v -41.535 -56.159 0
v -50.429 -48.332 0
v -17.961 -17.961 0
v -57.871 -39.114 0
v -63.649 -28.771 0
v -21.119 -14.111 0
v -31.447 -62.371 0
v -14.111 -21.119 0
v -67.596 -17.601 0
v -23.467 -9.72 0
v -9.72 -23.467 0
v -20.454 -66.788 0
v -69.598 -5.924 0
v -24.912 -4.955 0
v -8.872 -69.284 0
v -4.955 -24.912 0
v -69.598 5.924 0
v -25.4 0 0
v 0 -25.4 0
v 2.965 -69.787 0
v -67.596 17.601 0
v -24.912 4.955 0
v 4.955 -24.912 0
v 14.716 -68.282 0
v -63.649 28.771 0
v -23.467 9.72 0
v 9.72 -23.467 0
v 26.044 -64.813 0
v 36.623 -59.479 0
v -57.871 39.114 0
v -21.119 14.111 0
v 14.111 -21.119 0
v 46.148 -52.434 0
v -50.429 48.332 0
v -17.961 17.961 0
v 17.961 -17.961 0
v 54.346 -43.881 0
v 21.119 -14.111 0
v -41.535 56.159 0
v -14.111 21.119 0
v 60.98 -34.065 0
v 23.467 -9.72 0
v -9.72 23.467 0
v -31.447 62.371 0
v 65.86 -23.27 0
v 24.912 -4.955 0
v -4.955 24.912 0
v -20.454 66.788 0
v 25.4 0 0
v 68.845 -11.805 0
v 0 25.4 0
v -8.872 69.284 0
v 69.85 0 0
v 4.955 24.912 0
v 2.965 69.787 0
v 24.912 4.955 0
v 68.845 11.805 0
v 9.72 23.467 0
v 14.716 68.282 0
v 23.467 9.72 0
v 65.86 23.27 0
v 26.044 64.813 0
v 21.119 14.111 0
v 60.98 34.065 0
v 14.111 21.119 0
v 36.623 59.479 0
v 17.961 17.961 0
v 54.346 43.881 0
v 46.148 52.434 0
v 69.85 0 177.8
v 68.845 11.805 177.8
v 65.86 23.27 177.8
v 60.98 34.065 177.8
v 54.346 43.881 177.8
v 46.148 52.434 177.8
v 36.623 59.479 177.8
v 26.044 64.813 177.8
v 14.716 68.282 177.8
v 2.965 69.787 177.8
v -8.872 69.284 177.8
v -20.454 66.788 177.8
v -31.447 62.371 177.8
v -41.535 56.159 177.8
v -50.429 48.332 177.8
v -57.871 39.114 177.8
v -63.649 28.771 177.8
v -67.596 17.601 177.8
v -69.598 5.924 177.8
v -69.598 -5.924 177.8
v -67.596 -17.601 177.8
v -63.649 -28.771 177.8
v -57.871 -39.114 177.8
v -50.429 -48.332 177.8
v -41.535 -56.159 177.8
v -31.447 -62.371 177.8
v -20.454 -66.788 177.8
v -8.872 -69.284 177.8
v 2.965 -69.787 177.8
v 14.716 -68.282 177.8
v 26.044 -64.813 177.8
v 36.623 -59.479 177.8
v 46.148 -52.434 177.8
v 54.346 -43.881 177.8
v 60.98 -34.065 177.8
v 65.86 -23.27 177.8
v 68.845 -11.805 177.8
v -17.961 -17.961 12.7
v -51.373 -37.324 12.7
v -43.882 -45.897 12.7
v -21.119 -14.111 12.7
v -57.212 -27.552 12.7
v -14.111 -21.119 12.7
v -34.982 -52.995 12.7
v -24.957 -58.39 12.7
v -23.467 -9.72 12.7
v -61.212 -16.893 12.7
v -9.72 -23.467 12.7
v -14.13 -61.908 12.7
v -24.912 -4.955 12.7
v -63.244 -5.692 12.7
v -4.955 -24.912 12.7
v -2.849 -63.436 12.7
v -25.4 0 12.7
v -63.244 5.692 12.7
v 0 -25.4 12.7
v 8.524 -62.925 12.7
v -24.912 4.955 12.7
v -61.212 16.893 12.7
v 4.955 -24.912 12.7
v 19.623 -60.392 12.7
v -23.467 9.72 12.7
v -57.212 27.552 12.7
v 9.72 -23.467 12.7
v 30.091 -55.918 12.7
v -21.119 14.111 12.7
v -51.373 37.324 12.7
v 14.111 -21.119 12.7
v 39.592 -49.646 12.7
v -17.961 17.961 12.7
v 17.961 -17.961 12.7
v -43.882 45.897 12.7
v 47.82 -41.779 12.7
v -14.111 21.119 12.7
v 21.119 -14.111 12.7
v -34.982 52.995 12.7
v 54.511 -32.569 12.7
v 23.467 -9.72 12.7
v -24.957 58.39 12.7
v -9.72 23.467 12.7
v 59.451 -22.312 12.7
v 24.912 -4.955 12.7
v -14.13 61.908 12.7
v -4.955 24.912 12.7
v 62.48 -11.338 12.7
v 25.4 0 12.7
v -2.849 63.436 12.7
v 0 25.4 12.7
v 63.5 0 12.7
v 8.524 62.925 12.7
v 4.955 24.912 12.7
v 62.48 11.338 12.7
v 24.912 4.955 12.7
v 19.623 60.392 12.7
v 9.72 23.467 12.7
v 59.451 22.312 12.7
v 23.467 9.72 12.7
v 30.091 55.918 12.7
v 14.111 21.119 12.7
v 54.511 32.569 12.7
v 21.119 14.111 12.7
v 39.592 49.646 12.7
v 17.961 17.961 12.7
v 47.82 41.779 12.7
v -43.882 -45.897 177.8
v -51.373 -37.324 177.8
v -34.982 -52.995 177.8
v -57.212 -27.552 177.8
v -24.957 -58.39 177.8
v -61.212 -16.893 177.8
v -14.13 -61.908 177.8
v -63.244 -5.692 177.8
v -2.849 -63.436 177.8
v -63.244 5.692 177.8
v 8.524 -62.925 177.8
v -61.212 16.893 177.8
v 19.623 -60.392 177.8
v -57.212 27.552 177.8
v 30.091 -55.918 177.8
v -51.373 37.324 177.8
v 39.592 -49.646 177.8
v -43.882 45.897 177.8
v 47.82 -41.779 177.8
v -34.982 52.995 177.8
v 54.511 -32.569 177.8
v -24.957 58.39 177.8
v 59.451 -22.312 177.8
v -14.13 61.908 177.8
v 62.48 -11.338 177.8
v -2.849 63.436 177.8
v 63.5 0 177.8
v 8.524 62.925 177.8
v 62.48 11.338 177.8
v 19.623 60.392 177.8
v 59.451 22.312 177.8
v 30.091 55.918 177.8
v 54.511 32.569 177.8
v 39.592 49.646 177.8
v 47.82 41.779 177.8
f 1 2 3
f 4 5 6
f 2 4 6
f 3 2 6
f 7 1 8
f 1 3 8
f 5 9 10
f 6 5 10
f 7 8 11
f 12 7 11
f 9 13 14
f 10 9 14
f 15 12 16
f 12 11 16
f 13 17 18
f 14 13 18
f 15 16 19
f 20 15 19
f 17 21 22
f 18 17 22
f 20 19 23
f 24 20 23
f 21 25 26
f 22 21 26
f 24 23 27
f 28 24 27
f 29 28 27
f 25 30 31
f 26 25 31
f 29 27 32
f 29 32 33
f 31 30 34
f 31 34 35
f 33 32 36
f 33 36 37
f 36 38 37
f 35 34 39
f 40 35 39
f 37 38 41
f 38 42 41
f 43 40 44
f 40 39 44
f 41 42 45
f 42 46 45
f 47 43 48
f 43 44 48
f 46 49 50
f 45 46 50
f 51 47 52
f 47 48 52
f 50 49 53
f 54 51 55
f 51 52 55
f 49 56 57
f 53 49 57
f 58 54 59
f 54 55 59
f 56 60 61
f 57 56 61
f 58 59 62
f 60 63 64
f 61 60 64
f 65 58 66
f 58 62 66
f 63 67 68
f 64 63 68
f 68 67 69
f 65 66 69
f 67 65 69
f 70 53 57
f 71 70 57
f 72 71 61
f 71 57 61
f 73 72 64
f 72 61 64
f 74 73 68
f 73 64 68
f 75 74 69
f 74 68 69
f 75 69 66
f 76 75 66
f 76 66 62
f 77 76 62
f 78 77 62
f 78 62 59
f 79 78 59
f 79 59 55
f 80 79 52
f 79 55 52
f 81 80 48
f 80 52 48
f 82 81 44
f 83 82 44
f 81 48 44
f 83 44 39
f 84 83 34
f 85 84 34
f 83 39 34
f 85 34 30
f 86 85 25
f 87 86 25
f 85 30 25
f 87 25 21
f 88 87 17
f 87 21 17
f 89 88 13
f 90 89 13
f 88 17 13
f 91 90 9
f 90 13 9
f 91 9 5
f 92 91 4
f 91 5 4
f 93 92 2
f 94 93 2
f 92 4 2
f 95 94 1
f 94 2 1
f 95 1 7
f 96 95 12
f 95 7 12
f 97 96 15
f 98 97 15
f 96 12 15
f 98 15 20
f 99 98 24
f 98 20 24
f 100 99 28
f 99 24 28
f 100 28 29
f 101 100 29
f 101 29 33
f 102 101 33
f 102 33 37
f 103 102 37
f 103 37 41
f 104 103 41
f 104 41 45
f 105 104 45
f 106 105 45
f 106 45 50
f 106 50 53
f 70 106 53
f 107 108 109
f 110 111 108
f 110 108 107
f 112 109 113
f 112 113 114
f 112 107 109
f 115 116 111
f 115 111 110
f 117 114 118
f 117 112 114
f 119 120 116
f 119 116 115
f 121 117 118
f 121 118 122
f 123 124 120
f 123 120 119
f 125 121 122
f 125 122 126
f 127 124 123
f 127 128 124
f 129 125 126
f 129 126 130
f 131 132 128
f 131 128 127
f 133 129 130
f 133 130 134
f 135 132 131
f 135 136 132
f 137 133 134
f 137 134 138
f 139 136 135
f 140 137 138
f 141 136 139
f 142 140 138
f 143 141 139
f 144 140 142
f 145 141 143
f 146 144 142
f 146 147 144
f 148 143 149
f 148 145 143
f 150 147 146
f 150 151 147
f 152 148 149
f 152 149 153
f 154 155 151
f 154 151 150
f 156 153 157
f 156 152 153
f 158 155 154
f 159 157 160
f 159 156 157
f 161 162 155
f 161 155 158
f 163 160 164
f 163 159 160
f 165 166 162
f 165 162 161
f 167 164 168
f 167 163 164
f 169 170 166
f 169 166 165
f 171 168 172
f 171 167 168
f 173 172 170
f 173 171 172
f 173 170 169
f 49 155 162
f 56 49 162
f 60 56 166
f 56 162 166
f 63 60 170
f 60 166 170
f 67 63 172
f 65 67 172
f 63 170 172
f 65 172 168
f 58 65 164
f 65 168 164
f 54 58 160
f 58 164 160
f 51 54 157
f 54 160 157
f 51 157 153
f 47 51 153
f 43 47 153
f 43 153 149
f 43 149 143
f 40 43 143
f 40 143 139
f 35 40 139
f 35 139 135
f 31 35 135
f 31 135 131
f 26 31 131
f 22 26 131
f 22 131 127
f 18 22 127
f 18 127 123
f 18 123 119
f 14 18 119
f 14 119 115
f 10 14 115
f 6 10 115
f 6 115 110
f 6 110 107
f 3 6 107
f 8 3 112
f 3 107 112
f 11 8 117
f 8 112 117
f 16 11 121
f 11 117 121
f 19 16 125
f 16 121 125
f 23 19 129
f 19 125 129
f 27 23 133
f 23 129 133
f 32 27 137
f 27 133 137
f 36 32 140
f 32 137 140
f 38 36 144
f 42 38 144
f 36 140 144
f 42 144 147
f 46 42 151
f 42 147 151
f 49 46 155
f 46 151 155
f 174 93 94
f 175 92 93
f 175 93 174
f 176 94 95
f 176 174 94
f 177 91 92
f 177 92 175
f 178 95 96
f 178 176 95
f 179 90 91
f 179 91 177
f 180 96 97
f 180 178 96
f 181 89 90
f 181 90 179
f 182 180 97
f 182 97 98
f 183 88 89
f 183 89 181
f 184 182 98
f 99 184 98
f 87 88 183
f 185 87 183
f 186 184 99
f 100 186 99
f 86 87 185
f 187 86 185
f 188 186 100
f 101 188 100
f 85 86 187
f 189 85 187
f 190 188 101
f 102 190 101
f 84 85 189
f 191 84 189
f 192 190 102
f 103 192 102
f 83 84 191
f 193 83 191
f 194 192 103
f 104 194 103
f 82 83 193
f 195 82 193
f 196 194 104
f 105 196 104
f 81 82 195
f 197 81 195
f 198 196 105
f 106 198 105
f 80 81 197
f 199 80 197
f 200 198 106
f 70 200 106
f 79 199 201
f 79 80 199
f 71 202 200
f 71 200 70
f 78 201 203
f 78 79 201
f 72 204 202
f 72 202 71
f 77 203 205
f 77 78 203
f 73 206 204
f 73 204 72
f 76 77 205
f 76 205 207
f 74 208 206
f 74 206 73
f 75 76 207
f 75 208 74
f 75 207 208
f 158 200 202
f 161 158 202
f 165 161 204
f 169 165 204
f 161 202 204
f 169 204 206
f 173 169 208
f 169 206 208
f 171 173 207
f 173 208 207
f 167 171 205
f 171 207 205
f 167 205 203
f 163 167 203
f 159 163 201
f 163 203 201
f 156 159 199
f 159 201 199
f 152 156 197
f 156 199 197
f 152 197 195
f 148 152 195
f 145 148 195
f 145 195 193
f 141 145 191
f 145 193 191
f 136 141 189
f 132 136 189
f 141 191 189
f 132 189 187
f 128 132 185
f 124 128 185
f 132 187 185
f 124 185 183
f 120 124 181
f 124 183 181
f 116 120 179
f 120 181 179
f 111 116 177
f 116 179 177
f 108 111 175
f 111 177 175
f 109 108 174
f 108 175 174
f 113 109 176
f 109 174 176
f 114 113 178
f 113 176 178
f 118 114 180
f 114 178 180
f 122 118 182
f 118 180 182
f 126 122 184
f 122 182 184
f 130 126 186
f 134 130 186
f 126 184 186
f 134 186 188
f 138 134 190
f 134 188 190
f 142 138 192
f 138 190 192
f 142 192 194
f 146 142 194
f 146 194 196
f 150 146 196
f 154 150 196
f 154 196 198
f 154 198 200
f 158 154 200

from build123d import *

# Parameters (mm, degrees)
SKETCH1_R           = 69.85
BOSS_EXTRUDE1_DEPTH = 177.8
SKETCH2_R           = 25.4
CUT_EXTRUDE1_DEPTH  = 204.398340701
SKETCH3_R           = 63.5
CUT_EXTRUDE2_DEPTH  = 165.1


with BuildPart() as part:
    # Sketch1 → Boss-Extrude1 (new body)
    with BuildSketch(Plane.XY):
        Circle(SKETCH1_R)
    extrude(amount=BOSS_EXTRUDE1_DEPTH)

    # Sketch2 → Cut-Extrude1 (cut, through all)
    with BuildSketch(Plane.XY.offset(177.8)):
        Circle(SKETCH2_R)
    extrude(amount=-CUT_EXTRUDE1_DEPTH, mode=Mode.SUBTRACT)

    # Sketch3 → Cut-Extrude2 (cut)
    with BuildSketch(Plane.XY.offset(177.8)):
        Circle(SKETCH3_R)
    extrude(amount=-CUT_EXTRUDE2_DEPTH, mode=Mode.SUBTRACT)


solid = part.part
